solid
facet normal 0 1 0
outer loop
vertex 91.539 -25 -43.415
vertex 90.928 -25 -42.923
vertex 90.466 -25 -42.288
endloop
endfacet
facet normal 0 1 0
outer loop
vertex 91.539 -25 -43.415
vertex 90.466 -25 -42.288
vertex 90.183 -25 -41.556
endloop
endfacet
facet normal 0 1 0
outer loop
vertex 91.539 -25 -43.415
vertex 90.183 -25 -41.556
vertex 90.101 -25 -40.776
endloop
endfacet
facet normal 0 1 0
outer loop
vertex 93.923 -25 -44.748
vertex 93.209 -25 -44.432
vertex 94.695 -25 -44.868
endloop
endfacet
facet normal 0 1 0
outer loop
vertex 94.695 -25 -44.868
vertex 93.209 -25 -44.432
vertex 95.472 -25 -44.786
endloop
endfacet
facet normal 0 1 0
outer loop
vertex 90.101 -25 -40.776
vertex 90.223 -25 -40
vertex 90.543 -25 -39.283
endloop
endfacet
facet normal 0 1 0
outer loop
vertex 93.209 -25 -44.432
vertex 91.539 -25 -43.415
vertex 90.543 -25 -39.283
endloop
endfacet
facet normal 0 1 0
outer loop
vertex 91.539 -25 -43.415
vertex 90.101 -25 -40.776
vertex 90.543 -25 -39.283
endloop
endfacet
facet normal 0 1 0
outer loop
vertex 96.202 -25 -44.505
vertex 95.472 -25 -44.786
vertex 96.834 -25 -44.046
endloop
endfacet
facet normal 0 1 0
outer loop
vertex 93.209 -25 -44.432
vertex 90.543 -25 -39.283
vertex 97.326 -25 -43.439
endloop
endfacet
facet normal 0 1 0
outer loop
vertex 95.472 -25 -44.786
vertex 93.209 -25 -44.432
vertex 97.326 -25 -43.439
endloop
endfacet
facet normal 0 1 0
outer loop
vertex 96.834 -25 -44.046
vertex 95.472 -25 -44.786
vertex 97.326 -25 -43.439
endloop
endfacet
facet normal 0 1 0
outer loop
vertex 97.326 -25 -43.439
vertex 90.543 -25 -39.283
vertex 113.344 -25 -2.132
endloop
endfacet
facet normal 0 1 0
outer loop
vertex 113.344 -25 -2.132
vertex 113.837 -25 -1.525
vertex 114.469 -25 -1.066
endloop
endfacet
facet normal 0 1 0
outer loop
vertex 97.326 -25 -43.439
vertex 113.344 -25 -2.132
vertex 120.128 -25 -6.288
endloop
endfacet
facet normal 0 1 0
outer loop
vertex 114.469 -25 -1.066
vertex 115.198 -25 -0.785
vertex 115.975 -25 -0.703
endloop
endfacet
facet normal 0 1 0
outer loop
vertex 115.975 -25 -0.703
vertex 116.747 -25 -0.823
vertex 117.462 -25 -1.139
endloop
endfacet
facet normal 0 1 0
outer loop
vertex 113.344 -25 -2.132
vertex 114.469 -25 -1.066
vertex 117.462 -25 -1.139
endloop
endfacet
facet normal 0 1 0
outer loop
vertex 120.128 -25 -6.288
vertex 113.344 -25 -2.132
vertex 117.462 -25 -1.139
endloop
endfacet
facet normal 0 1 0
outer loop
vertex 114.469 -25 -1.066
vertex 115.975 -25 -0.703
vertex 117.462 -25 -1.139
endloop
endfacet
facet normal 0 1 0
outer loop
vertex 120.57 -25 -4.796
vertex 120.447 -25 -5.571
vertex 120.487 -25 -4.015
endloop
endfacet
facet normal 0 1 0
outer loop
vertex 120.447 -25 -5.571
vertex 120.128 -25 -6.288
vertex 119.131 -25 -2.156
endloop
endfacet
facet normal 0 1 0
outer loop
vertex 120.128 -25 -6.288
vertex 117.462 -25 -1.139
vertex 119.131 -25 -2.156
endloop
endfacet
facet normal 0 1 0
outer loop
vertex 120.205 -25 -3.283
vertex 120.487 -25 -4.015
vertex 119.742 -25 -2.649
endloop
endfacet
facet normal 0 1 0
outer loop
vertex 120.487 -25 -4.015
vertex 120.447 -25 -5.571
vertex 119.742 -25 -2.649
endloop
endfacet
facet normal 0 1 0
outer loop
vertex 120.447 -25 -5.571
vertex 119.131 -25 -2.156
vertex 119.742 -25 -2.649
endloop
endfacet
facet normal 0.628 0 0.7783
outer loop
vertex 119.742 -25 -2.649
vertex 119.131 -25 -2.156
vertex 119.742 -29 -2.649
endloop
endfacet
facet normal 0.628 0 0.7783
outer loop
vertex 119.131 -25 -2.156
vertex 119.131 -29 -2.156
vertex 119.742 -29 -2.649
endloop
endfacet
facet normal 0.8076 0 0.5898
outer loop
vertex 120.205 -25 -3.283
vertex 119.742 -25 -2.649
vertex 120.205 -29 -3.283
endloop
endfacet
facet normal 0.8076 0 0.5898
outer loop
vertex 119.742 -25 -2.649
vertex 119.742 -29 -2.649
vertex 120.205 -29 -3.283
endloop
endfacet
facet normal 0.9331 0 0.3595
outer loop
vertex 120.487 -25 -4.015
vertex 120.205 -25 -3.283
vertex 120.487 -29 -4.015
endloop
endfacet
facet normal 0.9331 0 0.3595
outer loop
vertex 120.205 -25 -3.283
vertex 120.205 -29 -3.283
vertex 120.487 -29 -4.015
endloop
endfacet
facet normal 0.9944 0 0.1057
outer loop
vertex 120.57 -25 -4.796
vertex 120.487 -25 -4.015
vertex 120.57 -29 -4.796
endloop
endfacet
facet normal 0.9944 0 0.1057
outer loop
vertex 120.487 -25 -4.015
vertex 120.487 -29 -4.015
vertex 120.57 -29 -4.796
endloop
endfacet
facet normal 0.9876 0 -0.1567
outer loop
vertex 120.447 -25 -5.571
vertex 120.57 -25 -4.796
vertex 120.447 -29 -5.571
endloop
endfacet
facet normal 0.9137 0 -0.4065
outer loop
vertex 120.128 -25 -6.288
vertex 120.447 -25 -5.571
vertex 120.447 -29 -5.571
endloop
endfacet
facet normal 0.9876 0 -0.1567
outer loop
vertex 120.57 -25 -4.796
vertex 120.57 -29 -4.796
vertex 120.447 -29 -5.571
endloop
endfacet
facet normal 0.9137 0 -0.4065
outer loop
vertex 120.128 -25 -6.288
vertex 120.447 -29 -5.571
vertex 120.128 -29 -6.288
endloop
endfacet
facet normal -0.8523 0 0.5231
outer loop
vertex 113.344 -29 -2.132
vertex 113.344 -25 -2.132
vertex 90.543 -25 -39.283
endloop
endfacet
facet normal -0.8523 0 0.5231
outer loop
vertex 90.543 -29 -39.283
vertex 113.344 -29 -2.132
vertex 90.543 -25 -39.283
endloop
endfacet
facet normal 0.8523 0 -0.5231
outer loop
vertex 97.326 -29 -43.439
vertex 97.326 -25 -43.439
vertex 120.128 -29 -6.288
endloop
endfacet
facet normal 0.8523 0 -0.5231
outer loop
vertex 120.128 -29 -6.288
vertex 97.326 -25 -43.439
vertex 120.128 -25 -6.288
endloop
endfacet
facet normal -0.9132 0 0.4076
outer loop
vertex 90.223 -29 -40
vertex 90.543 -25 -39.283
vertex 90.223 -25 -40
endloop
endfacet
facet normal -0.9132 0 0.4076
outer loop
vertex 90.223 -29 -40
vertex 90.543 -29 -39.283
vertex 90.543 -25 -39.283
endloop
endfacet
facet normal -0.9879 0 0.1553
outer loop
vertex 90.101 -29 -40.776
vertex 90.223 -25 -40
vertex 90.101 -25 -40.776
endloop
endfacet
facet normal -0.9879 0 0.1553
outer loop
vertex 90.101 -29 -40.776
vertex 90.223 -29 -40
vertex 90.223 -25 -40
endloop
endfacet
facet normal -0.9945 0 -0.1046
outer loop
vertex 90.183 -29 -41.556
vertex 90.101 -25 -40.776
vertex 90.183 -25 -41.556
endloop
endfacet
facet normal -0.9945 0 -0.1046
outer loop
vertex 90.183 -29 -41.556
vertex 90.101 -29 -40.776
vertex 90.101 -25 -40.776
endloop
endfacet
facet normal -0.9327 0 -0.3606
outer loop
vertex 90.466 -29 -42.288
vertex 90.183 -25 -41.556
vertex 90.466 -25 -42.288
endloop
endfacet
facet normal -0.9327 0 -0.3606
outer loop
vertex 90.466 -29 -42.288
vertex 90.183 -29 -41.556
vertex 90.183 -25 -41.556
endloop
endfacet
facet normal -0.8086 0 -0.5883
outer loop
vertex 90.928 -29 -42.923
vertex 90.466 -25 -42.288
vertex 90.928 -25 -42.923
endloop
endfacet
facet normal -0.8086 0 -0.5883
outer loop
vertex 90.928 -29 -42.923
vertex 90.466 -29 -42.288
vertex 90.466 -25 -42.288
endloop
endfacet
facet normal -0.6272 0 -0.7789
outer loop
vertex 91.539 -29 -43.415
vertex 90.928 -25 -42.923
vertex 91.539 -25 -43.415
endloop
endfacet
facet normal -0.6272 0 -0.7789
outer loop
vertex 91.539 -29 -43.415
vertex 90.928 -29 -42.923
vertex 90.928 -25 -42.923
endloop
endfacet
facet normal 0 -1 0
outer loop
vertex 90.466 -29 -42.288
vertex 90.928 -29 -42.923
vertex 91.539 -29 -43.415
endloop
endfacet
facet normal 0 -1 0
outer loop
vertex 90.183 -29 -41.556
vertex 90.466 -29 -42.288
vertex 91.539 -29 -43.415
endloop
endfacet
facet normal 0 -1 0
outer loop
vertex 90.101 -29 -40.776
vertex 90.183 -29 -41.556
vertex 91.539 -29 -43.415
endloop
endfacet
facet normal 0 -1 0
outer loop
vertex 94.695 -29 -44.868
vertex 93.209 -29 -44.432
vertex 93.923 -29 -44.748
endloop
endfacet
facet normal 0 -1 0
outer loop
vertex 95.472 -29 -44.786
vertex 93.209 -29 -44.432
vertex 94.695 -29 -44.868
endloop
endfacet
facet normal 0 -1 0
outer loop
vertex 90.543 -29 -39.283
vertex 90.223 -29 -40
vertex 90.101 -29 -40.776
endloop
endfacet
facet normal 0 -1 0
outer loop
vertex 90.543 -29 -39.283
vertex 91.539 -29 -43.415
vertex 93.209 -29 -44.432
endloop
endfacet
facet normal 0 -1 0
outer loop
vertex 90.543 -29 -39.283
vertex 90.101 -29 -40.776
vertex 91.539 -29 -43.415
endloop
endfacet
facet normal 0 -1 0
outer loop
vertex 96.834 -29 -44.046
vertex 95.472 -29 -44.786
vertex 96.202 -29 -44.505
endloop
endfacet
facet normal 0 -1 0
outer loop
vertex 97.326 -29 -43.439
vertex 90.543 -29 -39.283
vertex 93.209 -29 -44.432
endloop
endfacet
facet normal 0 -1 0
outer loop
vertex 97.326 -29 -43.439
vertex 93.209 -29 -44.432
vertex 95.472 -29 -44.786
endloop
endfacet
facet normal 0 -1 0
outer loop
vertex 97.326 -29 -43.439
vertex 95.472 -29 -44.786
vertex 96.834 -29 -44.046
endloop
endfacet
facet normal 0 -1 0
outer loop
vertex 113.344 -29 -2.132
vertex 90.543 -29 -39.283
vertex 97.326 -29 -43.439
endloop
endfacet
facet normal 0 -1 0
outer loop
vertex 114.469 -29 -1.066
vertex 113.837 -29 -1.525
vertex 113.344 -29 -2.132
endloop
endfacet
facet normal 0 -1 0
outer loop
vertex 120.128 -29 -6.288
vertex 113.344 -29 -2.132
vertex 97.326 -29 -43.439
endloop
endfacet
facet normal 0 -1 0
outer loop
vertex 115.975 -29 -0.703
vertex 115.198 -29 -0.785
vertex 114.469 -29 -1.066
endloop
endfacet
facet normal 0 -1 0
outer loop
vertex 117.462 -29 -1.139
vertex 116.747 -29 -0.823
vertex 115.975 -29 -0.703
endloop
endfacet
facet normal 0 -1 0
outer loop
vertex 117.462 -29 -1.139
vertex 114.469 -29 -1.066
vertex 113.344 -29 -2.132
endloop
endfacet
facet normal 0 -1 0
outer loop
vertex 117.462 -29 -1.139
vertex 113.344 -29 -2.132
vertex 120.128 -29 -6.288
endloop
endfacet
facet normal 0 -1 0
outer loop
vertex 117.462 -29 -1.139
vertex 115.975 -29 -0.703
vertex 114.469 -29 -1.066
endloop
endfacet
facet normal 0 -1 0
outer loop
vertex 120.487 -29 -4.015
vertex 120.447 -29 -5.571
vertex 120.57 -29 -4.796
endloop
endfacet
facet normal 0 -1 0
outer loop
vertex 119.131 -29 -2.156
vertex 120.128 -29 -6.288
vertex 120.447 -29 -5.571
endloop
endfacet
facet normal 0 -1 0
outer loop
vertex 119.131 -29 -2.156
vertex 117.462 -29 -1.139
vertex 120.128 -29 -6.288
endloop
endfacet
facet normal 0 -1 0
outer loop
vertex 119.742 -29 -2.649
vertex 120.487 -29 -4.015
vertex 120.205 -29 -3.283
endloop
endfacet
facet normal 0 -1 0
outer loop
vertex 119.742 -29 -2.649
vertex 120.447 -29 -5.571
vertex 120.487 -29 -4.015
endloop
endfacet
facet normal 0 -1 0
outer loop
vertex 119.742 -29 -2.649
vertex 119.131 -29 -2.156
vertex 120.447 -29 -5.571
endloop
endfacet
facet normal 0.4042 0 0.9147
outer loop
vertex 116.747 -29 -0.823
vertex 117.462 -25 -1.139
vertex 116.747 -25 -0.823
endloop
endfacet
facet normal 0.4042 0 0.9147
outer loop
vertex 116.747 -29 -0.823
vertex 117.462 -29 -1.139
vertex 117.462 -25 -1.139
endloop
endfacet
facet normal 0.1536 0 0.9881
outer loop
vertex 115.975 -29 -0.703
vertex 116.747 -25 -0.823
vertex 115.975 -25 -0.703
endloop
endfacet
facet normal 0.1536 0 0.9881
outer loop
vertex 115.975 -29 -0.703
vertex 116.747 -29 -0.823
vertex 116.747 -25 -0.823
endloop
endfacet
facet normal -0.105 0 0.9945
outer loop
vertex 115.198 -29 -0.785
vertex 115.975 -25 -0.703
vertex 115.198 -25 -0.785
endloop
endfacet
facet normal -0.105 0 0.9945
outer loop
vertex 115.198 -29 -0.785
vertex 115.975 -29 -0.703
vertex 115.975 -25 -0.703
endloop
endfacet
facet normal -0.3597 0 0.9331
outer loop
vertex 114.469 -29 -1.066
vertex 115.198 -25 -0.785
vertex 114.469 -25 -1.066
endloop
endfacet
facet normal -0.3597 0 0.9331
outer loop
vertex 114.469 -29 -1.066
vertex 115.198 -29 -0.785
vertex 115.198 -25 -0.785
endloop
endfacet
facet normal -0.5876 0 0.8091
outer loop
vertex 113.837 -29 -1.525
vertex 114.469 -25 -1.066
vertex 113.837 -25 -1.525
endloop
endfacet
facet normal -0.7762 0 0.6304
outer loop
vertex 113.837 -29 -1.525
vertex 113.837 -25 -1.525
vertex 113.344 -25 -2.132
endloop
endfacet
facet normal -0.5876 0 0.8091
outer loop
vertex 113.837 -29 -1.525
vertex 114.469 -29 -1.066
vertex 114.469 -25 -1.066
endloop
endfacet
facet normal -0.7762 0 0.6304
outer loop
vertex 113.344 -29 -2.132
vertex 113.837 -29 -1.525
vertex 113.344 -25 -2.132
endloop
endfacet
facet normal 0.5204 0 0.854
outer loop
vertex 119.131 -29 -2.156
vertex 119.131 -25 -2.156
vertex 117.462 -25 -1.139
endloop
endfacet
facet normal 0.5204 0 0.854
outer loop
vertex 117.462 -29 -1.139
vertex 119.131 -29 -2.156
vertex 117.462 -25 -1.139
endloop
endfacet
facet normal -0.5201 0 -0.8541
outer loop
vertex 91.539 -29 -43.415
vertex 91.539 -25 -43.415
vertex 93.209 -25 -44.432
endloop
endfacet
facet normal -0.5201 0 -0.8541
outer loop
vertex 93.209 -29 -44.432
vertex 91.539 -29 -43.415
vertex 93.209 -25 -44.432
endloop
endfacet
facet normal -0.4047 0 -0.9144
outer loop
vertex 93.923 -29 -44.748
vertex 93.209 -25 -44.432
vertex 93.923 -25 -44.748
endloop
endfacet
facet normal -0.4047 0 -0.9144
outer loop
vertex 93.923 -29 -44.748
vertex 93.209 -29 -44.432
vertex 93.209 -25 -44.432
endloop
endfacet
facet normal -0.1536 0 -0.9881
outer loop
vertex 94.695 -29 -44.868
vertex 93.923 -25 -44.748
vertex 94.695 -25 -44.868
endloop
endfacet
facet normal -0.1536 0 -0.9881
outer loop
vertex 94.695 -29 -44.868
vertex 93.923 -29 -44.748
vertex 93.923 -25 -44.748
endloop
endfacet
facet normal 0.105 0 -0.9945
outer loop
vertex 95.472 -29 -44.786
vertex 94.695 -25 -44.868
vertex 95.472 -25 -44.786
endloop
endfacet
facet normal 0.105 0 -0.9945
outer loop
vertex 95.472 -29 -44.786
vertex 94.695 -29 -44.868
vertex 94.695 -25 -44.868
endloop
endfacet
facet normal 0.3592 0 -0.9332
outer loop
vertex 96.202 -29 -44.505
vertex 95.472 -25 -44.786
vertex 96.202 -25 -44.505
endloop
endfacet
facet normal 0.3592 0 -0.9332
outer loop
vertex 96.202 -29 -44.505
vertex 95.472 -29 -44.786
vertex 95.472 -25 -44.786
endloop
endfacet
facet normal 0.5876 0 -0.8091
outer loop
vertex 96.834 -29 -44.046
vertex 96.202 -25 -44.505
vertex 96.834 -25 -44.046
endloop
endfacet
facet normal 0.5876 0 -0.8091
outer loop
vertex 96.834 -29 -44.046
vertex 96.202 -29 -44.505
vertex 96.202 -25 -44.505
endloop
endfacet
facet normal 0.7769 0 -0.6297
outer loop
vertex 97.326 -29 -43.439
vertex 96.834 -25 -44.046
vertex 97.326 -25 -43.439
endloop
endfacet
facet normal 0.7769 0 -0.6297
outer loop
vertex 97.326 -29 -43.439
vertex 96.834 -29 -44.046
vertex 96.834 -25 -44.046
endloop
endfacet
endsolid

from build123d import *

# Parameters (mm, degrees)
PAD024_DEPTH = 4
FILLET016_R  = 3


with BuildPart() as fillet016:
    # Sketch028 → Pad024 (new body)
    with BuildSketch(Plane.XZ.offset(25)):
        Polygon((-45.702244, -3.721947), (-38.908337, 0.415547), (-12.968213, -41.849118), (-19.76212, -45.986612), align=None)
    extrude(amount=PAD024_DEPTH)

    # Fillet016
    fillet016_edges = [fillet016.edges().sort_by_distance(p)[0] for p in [
        (-45.702244, -27, -3.721947),
        (-38.908337, -27, 0.415547),
        (-12.968213, -27, -41.849118),
        (-19.76212, -27, -45.986612),
    ]]
    fillet(fillet016_edges, radius=FILLET016_R)


with BuildPart() as part_mirroring012:
    # Part__Mirroring012: instance of Fillet016
    add(fillet016.part.mirror(Plane(origin=(0, 0, 0), x_dir=(0, -1, 0), z_dir=(1, 0, 0))))


with BuildPart() as part_mirroring012_1:
    # Part__Mirroring012 placement: moved
    add(part_mirroring012.part.moved(Location((76, 0, 0))))


solid = part_mirroring012_1.part
